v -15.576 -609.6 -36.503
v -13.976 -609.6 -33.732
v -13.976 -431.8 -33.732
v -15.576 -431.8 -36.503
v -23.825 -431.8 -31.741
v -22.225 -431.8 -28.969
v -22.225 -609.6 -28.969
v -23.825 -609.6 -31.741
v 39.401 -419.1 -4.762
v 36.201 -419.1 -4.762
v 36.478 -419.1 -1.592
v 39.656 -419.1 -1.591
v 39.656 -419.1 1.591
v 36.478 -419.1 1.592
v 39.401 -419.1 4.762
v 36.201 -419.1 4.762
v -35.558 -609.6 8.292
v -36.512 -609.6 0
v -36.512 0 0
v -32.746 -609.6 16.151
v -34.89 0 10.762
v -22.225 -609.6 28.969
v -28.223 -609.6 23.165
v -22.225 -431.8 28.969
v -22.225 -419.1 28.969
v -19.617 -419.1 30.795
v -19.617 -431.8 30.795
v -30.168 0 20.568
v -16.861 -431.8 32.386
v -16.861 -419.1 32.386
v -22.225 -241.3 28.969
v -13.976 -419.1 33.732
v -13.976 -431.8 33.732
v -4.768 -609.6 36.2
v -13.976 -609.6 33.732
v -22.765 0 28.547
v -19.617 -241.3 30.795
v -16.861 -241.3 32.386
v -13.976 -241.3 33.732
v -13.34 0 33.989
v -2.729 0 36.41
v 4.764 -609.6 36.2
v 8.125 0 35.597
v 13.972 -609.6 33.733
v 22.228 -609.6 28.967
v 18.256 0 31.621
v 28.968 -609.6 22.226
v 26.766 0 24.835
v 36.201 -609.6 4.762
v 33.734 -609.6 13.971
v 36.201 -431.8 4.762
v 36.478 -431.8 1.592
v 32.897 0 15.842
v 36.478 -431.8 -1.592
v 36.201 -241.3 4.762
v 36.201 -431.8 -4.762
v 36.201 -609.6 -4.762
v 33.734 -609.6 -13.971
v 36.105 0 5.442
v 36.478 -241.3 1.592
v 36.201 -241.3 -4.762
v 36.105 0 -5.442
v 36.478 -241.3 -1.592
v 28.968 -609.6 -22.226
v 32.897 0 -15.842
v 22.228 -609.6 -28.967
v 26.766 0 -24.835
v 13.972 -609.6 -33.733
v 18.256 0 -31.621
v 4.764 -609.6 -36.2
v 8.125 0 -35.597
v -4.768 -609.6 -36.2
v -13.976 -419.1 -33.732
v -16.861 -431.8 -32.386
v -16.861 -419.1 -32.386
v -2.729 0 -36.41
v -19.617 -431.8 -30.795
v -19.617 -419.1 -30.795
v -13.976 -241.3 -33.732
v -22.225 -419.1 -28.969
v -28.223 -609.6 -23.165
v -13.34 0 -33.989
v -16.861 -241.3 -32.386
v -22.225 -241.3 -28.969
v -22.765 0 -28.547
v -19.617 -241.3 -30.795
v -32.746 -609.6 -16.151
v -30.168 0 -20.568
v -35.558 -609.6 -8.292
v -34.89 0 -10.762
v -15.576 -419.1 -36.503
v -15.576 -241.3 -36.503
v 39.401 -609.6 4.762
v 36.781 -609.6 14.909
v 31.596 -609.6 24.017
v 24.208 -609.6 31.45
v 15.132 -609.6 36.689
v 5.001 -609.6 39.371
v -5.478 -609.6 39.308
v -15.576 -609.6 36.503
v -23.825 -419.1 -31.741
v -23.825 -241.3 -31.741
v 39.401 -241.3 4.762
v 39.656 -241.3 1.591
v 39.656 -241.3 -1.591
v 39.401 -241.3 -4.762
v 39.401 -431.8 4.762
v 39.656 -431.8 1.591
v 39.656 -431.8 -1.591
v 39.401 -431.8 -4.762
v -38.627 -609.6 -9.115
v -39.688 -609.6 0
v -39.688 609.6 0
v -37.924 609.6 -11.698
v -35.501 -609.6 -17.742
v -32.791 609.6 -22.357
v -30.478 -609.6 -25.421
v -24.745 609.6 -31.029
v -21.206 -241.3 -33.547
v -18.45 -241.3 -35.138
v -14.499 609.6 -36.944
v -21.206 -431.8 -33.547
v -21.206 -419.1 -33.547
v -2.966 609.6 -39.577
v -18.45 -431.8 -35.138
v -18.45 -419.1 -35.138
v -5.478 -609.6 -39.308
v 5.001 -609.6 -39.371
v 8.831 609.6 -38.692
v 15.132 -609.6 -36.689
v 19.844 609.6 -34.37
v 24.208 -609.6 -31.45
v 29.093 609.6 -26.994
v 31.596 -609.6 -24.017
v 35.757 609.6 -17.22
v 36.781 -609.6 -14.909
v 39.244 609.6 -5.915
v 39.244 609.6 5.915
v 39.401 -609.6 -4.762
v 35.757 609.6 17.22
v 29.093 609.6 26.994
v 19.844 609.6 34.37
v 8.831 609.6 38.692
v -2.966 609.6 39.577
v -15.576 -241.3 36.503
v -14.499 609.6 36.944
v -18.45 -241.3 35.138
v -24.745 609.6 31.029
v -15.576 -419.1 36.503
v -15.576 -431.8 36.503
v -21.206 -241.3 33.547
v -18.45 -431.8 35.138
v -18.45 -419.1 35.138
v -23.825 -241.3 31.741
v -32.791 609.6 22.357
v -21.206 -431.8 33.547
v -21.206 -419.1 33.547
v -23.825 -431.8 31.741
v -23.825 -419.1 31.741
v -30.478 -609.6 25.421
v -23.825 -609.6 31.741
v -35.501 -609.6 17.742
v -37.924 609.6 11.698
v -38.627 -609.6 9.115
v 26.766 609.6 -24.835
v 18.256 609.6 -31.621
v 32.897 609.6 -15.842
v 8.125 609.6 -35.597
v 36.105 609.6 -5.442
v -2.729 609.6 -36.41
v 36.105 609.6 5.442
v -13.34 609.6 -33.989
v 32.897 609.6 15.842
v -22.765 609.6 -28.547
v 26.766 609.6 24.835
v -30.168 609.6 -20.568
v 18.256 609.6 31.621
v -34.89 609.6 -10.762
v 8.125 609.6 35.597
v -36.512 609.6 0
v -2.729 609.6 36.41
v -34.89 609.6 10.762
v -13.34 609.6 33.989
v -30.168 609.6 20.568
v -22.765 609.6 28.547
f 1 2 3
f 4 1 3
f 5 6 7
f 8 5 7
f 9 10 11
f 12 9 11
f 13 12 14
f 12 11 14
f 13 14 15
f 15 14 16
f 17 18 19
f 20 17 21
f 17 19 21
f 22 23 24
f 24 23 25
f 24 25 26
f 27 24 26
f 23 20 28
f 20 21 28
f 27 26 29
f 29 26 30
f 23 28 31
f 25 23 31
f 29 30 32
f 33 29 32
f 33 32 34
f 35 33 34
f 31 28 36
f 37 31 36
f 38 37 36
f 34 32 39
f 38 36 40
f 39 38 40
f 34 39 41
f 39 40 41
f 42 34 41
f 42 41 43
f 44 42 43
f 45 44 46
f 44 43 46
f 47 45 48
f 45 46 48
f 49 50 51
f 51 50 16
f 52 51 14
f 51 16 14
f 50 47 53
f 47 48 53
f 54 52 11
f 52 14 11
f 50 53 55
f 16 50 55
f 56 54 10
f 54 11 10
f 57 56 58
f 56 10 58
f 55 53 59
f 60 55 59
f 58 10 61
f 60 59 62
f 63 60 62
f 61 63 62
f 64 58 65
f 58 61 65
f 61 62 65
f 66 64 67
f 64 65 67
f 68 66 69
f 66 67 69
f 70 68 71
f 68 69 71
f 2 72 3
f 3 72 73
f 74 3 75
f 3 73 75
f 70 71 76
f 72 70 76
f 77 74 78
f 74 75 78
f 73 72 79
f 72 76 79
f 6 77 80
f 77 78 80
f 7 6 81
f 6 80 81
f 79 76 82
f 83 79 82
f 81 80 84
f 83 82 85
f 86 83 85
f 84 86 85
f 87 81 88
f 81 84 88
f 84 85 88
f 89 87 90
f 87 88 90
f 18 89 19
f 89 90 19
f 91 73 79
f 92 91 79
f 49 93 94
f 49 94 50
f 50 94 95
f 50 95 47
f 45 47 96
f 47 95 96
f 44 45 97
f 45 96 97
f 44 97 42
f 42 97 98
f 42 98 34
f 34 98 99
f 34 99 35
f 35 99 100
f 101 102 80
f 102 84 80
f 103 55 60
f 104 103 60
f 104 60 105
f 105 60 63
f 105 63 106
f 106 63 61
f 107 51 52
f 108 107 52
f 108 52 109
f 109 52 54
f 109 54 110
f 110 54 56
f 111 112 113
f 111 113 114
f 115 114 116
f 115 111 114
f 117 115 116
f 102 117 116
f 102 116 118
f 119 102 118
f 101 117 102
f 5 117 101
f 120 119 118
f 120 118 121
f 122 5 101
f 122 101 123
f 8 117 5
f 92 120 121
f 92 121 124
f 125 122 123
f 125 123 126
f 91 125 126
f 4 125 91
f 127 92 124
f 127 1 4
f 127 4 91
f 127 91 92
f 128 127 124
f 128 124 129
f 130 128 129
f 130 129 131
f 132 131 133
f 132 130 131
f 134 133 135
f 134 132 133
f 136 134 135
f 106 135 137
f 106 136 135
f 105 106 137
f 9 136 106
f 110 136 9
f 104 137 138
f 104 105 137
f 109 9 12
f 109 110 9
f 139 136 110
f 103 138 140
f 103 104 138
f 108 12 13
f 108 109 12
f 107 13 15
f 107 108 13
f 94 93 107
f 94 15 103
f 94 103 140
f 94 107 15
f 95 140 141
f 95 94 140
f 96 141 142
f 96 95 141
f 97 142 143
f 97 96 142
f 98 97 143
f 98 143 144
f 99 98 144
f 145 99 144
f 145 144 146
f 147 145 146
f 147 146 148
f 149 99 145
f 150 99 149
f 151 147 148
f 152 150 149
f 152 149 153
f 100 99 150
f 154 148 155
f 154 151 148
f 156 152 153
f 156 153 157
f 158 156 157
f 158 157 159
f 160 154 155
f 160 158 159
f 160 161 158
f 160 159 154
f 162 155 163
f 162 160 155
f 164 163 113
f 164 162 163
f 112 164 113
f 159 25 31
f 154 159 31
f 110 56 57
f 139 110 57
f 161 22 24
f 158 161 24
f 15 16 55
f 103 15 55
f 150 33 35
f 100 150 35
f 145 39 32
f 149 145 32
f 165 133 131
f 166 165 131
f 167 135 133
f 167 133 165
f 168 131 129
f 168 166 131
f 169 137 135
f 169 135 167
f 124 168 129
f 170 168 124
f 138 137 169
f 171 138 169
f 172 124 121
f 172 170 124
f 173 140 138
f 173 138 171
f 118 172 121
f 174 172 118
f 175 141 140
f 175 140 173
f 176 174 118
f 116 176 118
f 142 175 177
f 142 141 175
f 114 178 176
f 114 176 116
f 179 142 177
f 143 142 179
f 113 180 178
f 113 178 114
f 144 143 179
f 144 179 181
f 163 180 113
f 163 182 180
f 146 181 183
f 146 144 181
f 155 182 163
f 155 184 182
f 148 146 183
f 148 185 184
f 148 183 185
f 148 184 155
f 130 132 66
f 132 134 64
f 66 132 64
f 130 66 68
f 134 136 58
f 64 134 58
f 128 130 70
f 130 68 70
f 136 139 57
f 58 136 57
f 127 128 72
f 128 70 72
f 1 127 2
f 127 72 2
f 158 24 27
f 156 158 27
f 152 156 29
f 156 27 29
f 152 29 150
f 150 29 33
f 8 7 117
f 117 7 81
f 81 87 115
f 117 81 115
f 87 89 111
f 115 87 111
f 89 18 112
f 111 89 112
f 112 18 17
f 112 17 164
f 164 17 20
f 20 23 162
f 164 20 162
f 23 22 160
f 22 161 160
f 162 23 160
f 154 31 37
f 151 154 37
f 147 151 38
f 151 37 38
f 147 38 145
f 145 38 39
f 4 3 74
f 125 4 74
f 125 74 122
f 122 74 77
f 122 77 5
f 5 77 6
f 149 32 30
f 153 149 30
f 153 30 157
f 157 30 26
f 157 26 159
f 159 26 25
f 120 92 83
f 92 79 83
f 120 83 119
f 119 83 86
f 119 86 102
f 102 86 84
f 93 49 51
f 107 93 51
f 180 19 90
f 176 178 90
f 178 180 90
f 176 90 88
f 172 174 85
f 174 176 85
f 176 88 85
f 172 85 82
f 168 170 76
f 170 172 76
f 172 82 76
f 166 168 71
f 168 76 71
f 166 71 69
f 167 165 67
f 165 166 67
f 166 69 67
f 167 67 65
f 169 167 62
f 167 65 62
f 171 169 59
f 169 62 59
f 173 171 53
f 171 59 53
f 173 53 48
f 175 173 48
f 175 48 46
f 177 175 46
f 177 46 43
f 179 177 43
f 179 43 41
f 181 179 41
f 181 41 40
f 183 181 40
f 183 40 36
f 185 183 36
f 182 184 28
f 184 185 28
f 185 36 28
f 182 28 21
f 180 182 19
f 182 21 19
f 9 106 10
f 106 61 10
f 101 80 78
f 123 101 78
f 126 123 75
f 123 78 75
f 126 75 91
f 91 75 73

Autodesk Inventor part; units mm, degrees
ref_plane "YZ Plane" through (0, 0, 0) normal (1, 0, 0) x (0, 1, 0)
ref_plane "XZ Plane" through (0, 0, 0) normal (0, 1, 0) x (-1, 0, 0)
ref_plane "XY Plane" through (0, 0, 0) normal (0, 0, 1) x (1, 0, 0)
sketch "Sketch1" plane through (0, 0, 0) normal (0, 1, 0) x (-1, 0, 0)
  circle A0 centre (0, 0) radius 36.5125
  circle A1 centre (0, 0) radius 39.6875
  dimension "d0" = 73.025
  dimension "d1" = 79.375
extrude "Extrusion1" add sketch "Sketch1" along normal mid plane 1219.2
sketch "Sketch2" plane through (0, 0, 0) normal (1, 0, 0) x (0, 1, 0)
  line L0 (-609.6, 4.7625) -> (-431.8, 4.7625)
  line L1 (-431.8, 4.7625) -> (-431.8, -4.7625)
  line L2 (-431.8, -4.7625) -> (-609.6, -4.7625)
  line L3 (-609.6, -4.7625) -> (-609.6, 4.7625)
  line L4 (-609.6, 39.6875) -> (-609.6, -39.6875) projected
  line L5 (-609.6, 39.6875) -> (-609.6, -39.6875) projected
  line L6 (609.6, -39.6875) -> (609.6, 39.6875) projected
  line L7 (-609.6, -39.6875) -> (609.6, -39.6875) projected
  line L8 (-419.1, 4.7625) -> (-241.3, 4.7625)
  line L9 (-241.3, 4.7625) -> (-241.3, -4.7625)
  line L10 (-241.3, -4.7625) -> (-419.1, -4.7625)
  line L11 (-419.1, -4.7625) -> (-419.1, 4.7625)
  point P0 (0, 0)
  dimension "d4" = 177.8
  dimension "d5" = 9.525
  dimension "d6" = 34.925
  dimension "d12" = 177.8
  dimension "d13" = 9.525
  dimension "d14" = 12.7
extrude "Extrusion2" cut sketch "Sketch2" along normal blind 76.2
pattern_circular "Circular Pattern1" count 3 over 360 about axis through (0, 0, 0) along (0, 1, 0) of "Extrusion2"
equation "\"d13\" = d5"
